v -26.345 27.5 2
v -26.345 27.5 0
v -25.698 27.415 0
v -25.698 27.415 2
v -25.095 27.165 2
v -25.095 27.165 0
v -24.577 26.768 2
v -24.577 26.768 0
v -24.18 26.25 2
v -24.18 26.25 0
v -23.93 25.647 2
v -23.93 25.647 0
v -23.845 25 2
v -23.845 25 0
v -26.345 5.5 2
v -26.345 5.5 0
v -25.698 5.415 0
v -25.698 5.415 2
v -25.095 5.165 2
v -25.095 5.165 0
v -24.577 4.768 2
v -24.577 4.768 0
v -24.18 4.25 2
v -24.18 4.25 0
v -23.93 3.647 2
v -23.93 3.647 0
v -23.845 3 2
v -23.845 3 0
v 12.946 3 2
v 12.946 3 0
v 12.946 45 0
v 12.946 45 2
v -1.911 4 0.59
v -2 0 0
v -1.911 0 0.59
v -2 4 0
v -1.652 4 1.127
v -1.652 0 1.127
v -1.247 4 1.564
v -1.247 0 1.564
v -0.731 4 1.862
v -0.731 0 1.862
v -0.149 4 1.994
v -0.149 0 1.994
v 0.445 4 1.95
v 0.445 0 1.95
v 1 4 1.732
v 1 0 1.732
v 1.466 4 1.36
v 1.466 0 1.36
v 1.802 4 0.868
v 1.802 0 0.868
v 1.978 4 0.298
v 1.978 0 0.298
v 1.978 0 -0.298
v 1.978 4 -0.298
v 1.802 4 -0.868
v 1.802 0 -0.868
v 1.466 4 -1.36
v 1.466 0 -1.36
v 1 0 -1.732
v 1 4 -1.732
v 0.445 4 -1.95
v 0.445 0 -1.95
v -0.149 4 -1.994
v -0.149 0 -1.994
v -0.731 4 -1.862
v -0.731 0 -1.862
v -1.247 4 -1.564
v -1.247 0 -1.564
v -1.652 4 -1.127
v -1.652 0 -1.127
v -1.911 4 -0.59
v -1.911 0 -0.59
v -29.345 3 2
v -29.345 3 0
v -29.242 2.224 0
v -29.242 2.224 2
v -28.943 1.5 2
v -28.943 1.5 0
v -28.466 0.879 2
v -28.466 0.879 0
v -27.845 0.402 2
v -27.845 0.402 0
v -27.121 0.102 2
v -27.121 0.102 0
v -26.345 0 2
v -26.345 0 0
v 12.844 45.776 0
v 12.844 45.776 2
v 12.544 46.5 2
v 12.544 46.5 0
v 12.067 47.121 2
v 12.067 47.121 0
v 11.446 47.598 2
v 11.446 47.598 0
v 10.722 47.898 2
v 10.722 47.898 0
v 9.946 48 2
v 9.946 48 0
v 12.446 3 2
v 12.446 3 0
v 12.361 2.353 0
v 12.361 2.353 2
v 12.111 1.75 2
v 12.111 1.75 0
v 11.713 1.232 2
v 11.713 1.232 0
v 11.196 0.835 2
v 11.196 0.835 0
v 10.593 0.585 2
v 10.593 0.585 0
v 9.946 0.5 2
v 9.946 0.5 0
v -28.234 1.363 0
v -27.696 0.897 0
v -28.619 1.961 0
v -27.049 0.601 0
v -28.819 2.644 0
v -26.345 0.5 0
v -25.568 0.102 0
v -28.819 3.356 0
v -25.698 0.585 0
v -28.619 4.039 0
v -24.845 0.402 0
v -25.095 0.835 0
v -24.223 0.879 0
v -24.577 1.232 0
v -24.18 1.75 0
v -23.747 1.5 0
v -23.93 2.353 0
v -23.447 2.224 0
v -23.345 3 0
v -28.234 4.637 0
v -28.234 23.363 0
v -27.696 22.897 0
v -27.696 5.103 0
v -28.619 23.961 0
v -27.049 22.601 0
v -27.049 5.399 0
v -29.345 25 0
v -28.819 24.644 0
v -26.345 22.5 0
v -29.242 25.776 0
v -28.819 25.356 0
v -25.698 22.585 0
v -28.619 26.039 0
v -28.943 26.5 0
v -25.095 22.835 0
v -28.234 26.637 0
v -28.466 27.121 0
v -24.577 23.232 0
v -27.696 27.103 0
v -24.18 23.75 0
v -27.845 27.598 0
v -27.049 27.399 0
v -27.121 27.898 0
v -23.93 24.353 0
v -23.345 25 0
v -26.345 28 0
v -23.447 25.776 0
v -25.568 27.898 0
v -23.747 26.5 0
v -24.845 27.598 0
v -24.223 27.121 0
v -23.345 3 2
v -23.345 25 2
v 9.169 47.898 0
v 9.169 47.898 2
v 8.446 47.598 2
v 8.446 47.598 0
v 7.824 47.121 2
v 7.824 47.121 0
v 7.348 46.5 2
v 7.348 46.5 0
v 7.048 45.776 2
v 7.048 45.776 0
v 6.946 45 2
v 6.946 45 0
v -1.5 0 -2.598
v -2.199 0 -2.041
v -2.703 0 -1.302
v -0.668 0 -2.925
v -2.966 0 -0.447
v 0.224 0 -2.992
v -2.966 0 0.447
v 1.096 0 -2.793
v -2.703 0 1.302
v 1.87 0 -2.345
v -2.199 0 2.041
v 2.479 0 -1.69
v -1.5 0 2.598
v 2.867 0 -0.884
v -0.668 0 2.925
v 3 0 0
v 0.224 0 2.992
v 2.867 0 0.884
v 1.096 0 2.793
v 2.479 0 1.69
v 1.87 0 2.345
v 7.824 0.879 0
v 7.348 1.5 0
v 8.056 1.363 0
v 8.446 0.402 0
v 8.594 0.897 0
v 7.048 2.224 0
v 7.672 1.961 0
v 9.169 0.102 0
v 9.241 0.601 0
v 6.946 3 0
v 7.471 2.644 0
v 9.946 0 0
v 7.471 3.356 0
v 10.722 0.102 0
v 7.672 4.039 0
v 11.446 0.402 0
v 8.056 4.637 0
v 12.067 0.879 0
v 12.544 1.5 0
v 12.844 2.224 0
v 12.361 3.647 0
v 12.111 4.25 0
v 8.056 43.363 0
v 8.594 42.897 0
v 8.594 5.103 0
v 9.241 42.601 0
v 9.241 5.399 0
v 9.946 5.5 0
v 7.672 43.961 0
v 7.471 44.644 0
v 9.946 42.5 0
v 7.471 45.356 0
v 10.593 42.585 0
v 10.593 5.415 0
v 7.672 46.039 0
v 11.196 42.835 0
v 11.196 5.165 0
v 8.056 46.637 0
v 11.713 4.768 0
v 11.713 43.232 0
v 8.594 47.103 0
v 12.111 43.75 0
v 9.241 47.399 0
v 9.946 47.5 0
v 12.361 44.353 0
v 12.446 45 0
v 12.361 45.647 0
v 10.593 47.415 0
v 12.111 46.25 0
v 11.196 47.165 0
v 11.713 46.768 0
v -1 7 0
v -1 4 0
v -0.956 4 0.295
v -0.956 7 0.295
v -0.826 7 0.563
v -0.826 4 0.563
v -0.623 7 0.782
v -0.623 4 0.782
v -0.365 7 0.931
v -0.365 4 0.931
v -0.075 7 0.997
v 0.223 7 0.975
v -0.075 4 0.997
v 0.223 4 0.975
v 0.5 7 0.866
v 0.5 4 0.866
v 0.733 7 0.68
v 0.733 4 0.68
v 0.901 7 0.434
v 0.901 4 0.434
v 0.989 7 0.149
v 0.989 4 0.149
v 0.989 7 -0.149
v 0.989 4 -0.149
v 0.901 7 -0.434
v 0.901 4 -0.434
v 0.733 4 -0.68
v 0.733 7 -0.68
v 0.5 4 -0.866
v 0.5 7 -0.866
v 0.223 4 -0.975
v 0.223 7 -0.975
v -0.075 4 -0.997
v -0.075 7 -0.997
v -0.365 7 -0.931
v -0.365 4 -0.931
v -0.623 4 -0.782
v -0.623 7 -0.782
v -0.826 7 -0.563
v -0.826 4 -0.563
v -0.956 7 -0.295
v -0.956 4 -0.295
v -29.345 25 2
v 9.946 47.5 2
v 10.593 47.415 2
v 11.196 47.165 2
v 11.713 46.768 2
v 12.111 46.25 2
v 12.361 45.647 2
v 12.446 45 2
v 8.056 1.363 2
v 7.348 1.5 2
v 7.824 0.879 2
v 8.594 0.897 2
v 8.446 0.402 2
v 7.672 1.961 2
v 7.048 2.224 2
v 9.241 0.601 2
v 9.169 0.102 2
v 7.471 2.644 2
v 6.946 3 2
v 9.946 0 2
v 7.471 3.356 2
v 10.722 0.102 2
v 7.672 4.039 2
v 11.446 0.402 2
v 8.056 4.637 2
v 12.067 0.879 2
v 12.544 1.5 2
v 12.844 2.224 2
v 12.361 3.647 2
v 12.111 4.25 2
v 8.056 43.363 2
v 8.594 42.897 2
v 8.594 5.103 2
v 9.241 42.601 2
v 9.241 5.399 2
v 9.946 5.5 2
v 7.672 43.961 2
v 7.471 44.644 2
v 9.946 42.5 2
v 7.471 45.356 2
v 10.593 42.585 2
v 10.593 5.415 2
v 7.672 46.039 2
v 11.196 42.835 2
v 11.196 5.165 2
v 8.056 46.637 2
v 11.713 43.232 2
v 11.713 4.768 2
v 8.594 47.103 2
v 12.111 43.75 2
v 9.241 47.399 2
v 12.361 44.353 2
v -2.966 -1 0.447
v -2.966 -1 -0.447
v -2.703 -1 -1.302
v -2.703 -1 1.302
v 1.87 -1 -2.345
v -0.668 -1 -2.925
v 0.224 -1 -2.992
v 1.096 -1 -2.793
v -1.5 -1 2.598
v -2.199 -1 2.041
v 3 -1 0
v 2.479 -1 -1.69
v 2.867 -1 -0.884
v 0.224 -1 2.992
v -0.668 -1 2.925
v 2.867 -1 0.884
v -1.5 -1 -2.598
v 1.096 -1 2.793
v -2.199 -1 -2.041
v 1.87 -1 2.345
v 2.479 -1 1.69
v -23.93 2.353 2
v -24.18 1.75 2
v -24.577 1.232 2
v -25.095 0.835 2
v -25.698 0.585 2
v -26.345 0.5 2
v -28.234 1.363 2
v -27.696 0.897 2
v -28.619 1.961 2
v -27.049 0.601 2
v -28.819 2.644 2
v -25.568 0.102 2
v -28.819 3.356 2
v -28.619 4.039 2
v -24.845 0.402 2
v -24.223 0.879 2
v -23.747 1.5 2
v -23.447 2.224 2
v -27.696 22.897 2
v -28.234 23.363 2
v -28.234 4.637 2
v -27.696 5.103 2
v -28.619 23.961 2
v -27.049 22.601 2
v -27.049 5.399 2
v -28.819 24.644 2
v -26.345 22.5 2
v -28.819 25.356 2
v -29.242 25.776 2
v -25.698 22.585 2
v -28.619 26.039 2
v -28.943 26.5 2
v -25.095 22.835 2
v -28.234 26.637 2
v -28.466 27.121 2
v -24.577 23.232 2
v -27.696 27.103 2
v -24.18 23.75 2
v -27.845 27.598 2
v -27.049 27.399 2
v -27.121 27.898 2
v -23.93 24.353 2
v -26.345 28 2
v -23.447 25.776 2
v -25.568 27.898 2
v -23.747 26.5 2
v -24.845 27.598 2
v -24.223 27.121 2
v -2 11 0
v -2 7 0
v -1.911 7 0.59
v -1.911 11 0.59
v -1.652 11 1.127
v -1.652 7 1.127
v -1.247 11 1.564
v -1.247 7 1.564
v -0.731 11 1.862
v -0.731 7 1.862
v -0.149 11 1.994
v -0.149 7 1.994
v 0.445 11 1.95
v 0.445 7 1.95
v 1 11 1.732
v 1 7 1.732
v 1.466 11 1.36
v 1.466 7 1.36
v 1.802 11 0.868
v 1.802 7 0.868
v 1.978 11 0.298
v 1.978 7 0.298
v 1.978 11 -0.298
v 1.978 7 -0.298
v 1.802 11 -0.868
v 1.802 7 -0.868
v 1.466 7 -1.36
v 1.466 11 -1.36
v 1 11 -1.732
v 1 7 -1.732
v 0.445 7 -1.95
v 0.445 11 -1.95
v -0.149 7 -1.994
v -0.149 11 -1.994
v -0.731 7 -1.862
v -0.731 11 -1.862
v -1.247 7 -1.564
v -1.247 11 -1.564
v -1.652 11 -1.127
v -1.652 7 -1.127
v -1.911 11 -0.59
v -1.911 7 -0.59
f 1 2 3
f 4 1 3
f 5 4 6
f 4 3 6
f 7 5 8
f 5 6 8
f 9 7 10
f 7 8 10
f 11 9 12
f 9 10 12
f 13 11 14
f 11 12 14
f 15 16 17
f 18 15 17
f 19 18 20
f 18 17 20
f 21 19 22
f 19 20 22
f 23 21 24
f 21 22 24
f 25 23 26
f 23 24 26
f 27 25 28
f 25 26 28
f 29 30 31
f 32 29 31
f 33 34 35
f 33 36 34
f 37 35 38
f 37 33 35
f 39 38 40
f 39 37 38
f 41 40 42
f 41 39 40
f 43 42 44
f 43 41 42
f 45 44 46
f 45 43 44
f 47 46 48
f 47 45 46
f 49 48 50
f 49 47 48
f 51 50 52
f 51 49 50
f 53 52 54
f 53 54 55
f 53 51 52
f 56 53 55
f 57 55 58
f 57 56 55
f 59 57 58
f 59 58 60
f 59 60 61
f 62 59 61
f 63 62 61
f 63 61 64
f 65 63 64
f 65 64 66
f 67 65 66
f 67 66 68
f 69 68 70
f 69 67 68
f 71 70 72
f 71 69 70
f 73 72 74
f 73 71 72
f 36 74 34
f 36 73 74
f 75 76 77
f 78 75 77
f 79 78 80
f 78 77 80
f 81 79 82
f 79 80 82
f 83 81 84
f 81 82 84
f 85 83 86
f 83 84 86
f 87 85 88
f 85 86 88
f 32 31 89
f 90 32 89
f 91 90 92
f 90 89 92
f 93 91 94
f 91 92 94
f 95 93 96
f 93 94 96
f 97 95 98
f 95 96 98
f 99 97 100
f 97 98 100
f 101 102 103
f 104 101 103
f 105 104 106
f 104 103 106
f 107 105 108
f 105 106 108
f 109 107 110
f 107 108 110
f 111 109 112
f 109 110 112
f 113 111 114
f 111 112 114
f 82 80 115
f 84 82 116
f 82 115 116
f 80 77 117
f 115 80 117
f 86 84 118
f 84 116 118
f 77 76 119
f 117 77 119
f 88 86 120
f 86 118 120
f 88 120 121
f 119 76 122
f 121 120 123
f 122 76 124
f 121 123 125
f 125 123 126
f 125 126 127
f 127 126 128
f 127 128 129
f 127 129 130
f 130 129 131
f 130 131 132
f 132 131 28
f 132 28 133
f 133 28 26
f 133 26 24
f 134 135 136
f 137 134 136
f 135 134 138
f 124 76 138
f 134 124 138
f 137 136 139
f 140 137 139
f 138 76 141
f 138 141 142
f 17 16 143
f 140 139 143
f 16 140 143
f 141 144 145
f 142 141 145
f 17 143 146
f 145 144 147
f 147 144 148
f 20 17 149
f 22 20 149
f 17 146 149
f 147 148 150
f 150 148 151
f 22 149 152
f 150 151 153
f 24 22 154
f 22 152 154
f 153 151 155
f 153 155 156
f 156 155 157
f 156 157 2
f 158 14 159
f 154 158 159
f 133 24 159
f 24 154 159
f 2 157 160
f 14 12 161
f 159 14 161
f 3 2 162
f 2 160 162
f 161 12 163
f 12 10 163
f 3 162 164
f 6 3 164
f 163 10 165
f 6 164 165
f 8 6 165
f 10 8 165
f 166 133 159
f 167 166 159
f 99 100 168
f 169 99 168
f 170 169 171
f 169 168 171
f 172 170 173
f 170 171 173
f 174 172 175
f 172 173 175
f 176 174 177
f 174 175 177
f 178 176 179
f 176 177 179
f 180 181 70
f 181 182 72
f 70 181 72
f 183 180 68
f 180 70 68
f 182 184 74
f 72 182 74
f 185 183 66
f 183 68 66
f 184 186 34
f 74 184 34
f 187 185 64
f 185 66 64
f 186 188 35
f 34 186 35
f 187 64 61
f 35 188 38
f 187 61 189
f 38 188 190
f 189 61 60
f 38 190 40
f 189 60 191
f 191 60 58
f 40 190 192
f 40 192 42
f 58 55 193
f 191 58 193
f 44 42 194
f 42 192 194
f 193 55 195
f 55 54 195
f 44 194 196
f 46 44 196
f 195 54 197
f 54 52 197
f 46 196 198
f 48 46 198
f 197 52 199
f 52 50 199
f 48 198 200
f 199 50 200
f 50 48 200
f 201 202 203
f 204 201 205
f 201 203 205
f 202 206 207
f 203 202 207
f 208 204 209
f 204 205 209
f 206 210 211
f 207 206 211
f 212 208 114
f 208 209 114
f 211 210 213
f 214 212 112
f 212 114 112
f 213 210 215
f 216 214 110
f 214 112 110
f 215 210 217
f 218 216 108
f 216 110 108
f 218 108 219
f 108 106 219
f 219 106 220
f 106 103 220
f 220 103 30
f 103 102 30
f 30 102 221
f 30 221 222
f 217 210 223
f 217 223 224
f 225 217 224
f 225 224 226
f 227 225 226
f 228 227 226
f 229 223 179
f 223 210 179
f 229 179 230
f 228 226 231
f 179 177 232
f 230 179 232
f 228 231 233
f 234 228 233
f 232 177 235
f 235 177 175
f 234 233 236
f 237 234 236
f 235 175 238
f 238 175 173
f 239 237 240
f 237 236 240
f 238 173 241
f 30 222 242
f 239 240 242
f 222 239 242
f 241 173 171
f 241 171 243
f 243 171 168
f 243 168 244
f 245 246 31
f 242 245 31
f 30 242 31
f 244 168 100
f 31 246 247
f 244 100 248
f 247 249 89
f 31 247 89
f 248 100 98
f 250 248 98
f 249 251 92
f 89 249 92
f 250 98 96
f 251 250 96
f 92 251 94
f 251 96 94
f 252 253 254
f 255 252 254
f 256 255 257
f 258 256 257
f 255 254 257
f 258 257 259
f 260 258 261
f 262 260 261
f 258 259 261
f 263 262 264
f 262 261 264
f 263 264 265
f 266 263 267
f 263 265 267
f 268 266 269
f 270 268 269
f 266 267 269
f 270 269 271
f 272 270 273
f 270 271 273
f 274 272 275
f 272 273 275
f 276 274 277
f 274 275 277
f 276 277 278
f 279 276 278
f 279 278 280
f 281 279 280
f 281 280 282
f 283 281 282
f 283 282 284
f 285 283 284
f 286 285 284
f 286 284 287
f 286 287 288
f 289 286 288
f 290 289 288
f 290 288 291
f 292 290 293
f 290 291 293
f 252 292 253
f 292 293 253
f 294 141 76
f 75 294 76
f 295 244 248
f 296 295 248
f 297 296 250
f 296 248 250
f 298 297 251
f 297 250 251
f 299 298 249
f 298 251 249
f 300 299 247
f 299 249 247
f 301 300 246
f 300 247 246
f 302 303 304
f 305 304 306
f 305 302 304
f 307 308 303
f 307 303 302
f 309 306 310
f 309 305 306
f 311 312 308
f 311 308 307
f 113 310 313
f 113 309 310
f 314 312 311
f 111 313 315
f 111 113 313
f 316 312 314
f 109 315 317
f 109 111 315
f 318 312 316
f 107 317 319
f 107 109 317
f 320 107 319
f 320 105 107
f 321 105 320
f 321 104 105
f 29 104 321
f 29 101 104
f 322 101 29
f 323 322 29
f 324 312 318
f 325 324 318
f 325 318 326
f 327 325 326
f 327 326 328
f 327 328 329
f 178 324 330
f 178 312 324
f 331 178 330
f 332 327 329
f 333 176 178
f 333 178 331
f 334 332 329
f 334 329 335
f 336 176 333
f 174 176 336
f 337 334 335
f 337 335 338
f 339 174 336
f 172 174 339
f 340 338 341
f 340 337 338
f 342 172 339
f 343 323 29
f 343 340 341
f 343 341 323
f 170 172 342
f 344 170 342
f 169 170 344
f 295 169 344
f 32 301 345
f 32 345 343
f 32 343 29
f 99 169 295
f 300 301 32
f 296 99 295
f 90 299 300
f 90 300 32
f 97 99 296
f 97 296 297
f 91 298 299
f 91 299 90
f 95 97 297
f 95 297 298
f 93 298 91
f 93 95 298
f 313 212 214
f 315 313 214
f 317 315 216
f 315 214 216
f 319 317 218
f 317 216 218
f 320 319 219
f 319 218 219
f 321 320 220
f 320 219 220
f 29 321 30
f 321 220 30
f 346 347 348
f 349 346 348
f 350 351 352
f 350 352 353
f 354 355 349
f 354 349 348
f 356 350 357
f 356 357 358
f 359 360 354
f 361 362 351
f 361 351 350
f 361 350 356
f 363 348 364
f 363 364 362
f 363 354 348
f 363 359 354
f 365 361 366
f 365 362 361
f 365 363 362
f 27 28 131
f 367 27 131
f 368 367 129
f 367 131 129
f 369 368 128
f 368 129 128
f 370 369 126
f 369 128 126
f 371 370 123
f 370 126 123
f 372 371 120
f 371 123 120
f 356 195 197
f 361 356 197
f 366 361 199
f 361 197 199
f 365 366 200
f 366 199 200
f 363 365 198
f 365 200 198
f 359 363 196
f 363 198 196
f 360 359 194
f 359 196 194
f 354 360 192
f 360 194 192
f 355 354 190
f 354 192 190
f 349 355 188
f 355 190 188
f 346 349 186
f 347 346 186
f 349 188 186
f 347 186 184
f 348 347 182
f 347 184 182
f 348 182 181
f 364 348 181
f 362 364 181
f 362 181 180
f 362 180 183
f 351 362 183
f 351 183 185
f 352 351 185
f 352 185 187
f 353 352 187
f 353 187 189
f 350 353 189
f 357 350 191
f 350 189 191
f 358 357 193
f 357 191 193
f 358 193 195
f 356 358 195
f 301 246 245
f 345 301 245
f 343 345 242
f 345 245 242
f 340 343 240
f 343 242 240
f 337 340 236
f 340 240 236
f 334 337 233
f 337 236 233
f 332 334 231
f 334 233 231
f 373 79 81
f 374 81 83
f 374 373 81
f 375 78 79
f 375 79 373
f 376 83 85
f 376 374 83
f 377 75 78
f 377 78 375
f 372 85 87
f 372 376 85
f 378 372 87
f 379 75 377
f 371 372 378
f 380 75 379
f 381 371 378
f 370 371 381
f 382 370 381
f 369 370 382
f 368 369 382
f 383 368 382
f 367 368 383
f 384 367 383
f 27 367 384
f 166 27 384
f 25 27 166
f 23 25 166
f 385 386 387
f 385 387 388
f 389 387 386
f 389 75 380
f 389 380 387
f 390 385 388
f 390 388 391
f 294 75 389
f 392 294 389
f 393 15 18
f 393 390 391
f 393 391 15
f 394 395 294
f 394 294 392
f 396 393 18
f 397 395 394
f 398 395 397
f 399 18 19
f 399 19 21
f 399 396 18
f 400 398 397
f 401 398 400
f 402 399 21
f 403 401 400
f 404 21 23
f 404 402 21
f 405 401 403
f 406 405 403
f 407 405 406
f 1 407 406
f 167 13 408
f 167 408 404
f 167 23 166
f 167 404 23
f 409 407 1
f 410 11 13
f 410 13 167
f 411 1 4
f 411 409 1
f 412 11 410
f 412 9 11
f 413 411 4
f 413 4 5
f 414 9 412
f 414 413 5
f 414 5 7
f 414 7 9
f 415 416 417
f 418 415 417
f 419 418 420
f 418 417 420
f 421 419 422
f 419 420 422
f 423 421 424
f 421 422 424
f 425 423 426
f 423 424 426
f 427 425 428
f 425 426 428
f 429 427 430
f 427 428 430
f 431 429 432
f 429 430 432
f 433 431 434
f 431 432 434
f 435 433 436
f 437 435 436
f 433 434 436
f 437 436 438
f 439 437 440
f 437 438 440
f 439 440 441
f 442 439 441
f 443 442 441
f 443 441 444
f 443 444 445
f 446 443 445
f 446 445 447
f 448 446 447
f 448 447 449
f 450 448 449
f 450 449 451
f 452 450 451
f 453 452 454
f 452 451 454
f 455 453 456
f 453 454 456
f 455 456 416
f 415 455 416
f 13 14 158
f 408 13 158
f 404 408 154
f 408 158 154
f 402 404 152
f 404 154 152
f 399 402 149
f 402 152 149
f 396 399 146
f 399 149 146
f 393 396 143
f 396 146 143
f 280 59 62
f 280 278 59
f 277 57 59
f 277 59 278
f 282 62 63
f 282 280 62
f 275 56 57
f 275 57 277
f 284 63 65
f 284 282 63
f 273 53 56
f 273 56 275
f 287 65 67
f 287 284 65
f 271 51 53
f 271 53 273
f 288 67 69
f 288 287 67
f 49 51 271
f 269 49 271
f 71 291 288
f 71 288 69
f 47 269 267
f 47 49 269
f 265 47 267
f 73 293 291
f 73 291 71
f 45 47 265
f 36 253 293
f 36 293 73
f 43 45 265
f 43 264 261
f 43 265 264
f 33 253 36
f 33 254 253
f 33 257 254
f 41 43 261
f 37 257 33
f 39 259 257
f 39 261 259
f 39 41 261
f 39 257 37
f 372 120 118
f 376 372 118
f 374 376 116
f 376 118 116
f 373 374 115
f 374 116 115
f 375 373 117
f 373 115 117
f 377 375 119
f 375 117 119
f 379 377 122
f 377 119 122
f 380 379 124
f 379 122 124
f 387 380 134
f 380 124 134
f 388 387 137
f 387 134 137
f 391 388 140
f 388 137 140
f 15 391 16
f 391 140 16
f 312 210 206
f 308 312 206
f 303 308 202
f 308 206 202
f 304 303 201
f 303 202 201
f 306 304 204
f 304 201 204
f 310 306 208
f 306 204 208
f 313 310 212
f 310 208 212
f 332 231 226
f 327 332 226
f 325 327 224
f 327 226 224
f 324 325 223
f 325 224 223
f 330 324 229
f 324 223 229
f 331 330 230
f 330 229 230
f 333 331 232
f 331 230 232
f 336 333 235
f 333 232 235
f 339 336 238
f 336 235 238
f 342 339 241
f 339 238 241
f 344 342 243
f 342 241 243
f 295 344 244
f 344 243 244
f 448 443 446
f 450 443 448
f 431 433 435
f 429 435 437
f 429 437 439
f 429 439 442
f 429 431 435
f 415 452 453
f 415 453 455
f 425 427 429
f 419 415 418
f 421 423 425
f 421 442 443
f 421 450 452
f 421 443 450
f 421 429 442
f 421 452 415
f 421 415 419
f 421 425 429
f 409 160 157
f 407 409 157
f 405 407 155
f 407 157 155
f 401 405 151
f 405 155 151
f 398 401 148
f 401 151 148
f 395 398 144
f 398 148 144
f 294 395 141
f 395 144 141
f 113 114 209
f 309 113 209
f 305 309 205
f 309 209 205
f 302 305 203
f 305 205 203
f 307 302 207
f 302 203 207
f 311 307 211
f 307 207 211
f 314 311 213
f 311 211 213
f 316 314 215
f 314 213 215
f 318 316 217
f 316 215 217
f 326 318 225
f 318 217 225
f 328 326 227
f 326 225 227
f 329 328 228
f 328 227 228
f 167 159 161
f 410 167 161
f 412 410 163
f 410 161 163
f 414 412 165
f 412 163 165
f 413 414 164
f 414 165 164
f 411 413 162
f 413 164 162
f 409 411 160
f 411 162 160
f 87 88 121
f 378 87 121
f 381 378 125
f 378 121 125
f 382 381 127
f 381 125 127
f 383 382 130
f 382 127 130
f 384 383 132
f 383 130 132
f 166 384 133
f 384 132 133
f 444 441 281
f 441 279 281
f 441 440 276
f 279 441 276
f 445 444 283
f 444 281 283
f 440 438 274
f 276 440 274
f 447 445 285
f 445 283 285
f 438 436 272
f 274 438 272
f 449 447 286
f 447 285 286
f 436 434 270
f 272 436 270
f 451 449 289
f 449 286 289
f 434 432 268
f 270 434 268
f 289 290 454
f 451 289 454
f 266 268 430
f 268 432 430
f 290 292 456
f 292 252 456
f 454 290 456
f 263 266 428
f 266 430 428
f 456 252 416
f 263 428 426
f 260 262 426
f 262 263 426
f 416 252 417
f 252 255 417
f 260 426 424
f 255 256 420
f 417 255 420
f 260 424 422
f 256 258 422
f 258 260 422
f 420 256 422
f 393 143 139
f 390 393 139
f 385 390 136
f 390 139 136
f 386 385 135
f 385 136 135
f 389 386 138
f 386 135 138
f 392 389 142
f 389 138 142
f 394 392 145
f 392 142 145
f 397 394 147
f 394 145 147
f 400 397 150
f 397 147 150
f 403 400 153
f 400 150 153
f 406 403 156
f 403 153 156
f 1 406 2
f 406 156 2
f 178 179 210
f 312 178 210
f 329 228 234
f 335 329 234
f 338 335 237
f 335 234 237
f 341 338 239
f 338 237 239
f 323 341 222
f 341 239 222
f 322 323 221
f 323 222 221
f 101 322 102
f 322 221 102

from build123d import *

# Parameters (mm, degrees)
F1_DEPTH = 2
F2_DEPTH = 2
F0_W     = 2
F0_H     = 4
F4_R     = 3
F4_R_2   = 2
F5_DEPTH = 1
F6_R     = 1
F7_DEPTH = 3
F8_R     = 2
F8_R_2   = 1
F9_DEPTH = 4


with BuildPart() as f1:
    # F0 (on Top) → F1 (new body)
    with BuildSketch(Plane.XY):
        with BuildLine():
            Line((-26.344706, 0.5), (-26.344706, 0))
            ThreePointArc((-26.344706, 0), (-24.223386, 0.87868), (-23.344706, 3))
            Line((-23.344706, 3), (-23.344706, 25))
            ThreePointArc((-23.344706, 25), (-24.223386, 27.12132), (-26.344706, 28))
            Line((-26.344706, 28), (-26.344706, 27.5))
            ThreePointArc((-26.344706, 27.5), (-24.576939, 26.767767), (-23.844706, 25))
            ThreePointArc((-23.844706, 25), (-24.576939, 23.232233), (-26.344706, 22.5))
            Line((-26.344706, 22.5), (-26.344706, 5.5))
            ThreePointArc((-26.344706, 5.5), (-24.576939, 4.767767), (-23.844706, 3))
            ThreePointArc((-23.844706, 3), (-24.576939, 1.232233), (-26.344706, 0.5))
        make_face()
        with BuildLine():
            Line((-29.344706, 25), (-29.344706, 3))
            ThreePointArc((-29.344706, 3), (-28.466026, 0.87868), (-26.344706, 0))
            Line((-26.344706, 0), (-26.344706, 0.5))
            ThreePointArc((-26.344706, 0.5), (-28.844706, 3), (-26.344706, 5.5))
            Line((-26.344706, 5.5), (-26.344706, 22.5))
            ThreePointArc((-26.344706, 22.5), (-28.844706, 25), (-26.344706, 27.5))
            Line((-26.344706, 27.5), (-26.344706, 28))
            ThreePointArc((-26.344706, 28), (-28.466026, 27.12132), (-29.344706, 25))
        make_face()
    extrude(amount=F1_DEPTH)


with BuildPart() as f2:
    # F0 (on Top) → F2 (new body)
    with BuildSketch(Plane.XY):
        with BuildLine():
            Line((9.945723, 0.5), (9.945723, 0))
            ThreePointArc((9.945723, 0), (12.067044, 0.87868), (12.945723, 3))
            Line((12.945723, 3), (12.945723, 45))
            ThreePointArc((12.945723, 45), (12.067044, 47.12132), (9.945723, 48))
            Line((9.945723, 48), (9.945723, 47.5))
            ThreePointArc((9.945723, 47.5), (11.71349, 46.767767), (12.445723, 45))
            ThreePointArc((12.445723, 45), (11.71349, 43.232233), (9.945723, 42.5))
            Line((9.945723, 42.5), (9.945723, 5.5))
            ThreePointArc((9.945723, 5.5), (11.71349, 4.767767), (12.445723, 3))
            ThreePointArc((12.445723, 3), (11.71349, 1.232233), (9.945723, 0.5))
        make_face()
        with BuildLine():
            ThreePointArc((6.945723, 3), (7.824403, 0.87868), (9.945723, 0))
            Line((9.945723, 0), (9.945723, 0.5))
            ThreePointArc((9.945723, 0.5), (7.445723, 3), (9.945723, 5.5))
            Line((9.945723, 5.5), (9.945723, 42.5))
            ThreePointArc((9.945723, 42.5), (7.445723, 45), (9.945723, 47.5))
            Line((9.945723, 47.5), (9.945723, 48))
            ThreePointArc((9.945723, 48), (7.824403, 47.12132), (6.945723, 45))
            Line((6.945723, 45), (6.945723, 3))
        make_face()
    extrude(amount=F2_DEPTH)


with BuildPart() as f3:
    # F0 (on Top) → F3 (revolve)
    with BuildSketch(Plane.XY):
        with Locations((-1, 2)):
            Rectangle(F0_W, F0_H)
    revolve(axis=Axis((0, 2, 0), (0, 1, 0)))

    # F4 (on face) → F5 (join)
    with BuildSketch(Plane.XZ):
        Circle(F4_R)
        Circle(F4_R_2, mode=Mode.SUBTRACT)
        Circle(F4_R_2)
    extrude(amount=F5_DEPTH)

    # F6 (on face) → F7 (join)
    with BuildSketch(Plane(origin=(0, 4, 0), x_dir=(-1, 0, 0), z_dir=(0, 1, 0))):
        Circle(F6_R)
    extrude(amount=F7_DEPTH)

    # F8 (on face) → F9 (join)
    with BuildSketch(Plane(origin=(0, 7, 0), x_dir=(-1, 0, 0), z_dir=(0, 1, 0))):
        Circle(F8_R)
        Circle(F8_R_2, mode=Mode.SUBTRACT)
        Circle(F8_R_2)
    extrude(amount=F9_DEPTH)


solid = Compound([f1.part, f2.part, f3.part])
